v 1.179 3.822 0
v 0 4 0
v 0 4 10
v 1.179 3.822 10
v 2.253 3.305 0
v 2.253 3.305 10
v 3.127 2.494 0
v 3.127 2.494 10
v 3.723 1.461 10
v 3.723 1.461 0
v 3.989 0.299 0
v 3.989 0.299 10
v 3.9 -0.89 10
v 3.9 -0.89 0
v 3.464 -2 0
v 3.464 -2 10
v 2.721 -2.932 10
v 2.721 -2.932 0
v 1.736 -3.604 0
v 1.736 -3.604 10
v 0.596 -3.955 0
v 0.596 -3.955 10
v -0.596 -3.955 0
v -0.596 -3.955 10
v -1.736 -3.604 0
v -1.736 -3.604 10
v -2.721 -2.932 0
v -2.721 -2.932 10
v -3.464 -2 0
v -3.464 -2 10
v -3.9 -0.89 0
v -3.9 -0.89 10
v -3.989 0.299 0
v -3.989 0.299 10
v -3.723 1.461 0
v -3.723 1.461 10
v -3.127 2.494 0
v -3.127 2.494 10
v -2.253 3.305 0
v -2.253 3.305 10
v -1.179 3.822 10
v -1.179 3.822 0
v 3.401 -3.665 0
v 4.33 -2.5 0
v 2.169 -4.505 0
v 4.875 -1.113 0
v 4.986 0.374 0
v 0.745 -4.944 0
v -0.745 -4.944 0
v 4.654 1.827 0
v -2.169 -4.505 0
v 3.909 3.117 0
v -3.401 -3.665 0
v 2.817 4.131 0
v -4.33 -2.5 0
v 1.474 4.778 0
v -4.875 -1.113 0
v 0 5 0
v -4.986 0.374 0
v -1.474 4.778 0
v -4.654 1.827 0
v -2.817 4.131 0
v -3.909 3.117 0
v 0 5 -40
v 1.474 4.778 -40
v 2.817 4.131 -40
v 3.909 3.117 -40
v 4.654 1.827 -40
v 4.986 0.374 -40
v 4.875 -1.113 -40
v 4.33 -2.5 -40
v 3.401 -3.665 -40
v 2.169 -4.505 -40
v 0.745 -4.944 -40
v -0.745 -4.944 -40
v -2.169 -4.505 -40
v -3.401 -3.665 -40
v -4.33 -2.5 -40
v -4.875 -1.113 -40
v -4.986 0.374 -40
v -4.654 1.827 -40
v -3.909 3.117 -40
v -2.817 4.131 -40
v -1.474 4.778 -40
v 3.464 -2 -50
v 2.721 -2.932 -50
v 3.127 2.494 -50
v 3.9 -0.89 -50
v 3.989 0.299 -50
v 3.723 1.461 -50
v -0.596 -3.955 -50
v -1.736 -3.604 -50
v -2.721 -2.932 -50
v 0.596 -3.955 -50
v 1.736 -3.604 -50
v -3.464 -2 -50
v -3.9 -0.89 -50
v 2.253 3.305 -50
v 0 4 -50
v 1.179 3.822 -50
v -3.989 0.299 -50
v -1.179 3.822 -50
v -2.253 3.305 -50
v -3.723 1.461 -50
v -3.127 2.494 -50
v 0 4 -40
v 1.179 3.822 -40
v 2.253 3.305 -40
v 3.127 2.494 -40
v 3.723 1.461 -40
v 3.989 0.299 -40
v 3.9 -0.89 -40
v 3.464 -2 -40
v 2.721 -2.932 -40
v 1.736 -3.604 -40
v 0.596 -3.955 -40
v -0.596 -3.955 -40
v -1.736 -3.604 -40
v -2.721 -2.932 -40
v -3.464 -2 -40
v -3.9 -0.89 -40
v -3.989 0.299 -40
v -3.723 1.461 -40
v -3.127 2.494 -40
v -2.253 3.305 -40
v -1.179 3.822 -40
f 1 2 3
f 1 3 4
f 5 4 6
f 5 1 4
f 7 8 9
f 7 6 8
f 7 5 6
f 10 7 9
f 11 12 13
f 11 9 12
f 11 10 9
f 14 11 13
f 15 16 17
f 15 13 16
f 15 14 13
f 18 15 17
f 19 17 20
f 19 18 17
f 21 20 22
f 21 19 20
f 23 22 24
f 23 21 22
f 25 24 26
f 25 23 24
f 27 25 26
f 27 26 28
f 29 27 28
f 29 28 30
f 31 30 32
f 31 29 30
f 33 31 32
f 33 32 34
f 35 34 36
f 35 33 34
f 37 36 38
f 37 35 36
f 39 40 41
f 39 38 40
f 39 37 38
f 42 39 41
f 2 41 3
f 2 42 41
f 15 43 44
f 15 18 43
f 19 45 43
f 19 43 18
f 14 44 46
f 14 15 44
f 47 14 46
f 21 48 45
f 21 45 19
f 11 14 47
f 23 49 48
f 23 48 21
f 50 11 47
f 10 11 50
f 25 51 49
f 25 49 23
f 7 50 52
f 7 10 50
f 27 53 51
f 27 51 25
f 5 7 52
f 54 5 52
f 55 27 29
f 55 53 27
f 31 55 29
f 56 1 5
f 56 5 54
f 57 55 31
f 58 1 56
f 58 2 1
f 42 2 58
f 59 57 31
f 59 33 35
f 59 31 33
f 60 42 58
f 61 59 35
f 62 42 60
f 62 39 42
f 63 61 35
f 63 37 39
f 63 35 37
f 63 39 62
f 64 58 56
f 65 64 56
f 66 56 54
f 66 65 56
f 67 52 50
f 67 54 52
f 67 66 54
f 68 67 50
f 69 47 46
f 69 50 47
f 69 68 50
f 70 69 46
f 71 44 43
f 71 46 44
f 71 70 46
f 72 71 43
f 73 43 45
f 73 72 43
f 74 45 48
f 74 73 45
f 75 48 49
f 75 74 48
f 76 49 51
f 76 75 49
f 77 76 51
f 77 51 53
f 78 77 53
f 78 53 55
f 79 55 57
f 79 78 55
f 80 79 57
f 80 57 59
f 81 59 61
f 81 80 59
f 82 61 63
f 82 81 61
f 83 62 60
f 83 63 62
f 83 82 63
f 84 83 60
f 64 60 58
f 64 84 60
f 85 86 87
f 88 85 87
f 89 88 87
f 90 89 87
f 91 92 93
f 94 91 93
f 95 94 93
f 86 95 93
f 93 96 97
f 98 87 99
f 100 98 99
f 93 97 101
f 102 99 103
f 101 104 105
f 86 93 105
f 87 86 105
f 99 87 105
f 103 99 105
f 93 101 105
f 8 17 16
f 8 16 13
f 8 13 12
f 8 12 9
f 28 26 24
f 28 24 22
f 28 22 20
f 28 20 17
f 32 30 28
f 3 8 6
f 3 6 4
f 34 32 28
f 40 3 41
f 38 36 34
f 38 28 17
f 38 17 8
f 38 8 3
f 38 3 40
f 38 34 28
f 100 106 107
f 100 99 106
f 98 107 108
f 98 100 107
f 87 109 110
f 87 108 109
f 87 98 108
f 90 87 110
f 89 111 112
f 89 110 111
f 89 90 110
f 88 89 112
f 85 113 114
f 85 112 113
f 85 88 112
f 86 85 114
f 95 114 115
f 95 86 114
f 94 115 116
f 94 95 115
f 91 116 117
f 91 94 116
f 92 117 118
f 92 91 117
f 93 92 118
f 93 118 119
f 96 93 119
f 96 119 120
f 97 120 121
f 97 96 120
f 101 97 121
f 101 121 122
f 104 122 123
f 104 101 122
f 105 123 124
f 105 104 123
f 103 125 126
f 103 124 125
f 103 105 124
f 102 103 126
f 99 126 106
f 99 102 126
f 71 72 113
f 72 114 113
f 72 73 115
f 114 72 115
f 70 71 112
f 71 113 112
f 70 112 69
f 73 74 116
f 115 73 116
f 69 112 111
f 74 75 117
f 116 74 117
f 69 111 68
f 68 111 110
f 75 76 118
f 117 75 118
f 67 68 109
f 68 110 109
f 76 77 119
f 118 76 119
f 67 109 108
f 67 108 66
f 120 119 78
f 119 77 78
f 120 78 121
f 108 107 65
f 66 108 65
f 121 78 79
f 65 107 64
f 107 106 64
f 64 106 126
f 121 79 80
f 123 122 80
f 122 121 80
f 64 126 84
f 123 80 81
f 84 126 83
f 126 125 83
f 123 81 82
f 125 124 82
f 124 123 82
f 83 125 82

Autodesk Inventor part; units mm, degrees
ref_plane "YZ Plane" through (0, 0, 0) normal (1, 0, 0) x (0, 1, 0)
ref_plane "XZ Plane" through (0, 0, 0) normal (0, 1, 0) x (-1, 0, 0)
ref_plane "XY Plane" through (0, 0, 0) normal (0, 0, 1) x (1, 0, 0)
sketch "Sketch1" plane through (0, 0, 0) normal (1, 0, 0) x (0, 1, 0)
  line L0 (0, 10) -> (4, 10)
  line L1 (4, 10) -> (4, 0)
  line L2 (4, 0) -> (5, 0)
  line L3 (5, 0) -> (5, -40)
  line L4 (5, -40) -> (4, -40)
  line L5 (4, -40) -> (4, -50)
  line L6 (4, -50) -> (0, -50)
  line L7 (0, -50) -> (0, 10)
  point P0 (0, 0)
  dimension "d0" = 4
  dimension "d1" = 10
  dimension "d2" = 10
  dimension "d3" = 5
  dimension "d4" = 0
  dimension "d5" = 0
  dimension "d6" = 40
revolve "Revolution1" add sketch "Sketch1" angle 360 about axis through (0, 0, -50) along (0, 0, 1)
properties part number "eixo"
